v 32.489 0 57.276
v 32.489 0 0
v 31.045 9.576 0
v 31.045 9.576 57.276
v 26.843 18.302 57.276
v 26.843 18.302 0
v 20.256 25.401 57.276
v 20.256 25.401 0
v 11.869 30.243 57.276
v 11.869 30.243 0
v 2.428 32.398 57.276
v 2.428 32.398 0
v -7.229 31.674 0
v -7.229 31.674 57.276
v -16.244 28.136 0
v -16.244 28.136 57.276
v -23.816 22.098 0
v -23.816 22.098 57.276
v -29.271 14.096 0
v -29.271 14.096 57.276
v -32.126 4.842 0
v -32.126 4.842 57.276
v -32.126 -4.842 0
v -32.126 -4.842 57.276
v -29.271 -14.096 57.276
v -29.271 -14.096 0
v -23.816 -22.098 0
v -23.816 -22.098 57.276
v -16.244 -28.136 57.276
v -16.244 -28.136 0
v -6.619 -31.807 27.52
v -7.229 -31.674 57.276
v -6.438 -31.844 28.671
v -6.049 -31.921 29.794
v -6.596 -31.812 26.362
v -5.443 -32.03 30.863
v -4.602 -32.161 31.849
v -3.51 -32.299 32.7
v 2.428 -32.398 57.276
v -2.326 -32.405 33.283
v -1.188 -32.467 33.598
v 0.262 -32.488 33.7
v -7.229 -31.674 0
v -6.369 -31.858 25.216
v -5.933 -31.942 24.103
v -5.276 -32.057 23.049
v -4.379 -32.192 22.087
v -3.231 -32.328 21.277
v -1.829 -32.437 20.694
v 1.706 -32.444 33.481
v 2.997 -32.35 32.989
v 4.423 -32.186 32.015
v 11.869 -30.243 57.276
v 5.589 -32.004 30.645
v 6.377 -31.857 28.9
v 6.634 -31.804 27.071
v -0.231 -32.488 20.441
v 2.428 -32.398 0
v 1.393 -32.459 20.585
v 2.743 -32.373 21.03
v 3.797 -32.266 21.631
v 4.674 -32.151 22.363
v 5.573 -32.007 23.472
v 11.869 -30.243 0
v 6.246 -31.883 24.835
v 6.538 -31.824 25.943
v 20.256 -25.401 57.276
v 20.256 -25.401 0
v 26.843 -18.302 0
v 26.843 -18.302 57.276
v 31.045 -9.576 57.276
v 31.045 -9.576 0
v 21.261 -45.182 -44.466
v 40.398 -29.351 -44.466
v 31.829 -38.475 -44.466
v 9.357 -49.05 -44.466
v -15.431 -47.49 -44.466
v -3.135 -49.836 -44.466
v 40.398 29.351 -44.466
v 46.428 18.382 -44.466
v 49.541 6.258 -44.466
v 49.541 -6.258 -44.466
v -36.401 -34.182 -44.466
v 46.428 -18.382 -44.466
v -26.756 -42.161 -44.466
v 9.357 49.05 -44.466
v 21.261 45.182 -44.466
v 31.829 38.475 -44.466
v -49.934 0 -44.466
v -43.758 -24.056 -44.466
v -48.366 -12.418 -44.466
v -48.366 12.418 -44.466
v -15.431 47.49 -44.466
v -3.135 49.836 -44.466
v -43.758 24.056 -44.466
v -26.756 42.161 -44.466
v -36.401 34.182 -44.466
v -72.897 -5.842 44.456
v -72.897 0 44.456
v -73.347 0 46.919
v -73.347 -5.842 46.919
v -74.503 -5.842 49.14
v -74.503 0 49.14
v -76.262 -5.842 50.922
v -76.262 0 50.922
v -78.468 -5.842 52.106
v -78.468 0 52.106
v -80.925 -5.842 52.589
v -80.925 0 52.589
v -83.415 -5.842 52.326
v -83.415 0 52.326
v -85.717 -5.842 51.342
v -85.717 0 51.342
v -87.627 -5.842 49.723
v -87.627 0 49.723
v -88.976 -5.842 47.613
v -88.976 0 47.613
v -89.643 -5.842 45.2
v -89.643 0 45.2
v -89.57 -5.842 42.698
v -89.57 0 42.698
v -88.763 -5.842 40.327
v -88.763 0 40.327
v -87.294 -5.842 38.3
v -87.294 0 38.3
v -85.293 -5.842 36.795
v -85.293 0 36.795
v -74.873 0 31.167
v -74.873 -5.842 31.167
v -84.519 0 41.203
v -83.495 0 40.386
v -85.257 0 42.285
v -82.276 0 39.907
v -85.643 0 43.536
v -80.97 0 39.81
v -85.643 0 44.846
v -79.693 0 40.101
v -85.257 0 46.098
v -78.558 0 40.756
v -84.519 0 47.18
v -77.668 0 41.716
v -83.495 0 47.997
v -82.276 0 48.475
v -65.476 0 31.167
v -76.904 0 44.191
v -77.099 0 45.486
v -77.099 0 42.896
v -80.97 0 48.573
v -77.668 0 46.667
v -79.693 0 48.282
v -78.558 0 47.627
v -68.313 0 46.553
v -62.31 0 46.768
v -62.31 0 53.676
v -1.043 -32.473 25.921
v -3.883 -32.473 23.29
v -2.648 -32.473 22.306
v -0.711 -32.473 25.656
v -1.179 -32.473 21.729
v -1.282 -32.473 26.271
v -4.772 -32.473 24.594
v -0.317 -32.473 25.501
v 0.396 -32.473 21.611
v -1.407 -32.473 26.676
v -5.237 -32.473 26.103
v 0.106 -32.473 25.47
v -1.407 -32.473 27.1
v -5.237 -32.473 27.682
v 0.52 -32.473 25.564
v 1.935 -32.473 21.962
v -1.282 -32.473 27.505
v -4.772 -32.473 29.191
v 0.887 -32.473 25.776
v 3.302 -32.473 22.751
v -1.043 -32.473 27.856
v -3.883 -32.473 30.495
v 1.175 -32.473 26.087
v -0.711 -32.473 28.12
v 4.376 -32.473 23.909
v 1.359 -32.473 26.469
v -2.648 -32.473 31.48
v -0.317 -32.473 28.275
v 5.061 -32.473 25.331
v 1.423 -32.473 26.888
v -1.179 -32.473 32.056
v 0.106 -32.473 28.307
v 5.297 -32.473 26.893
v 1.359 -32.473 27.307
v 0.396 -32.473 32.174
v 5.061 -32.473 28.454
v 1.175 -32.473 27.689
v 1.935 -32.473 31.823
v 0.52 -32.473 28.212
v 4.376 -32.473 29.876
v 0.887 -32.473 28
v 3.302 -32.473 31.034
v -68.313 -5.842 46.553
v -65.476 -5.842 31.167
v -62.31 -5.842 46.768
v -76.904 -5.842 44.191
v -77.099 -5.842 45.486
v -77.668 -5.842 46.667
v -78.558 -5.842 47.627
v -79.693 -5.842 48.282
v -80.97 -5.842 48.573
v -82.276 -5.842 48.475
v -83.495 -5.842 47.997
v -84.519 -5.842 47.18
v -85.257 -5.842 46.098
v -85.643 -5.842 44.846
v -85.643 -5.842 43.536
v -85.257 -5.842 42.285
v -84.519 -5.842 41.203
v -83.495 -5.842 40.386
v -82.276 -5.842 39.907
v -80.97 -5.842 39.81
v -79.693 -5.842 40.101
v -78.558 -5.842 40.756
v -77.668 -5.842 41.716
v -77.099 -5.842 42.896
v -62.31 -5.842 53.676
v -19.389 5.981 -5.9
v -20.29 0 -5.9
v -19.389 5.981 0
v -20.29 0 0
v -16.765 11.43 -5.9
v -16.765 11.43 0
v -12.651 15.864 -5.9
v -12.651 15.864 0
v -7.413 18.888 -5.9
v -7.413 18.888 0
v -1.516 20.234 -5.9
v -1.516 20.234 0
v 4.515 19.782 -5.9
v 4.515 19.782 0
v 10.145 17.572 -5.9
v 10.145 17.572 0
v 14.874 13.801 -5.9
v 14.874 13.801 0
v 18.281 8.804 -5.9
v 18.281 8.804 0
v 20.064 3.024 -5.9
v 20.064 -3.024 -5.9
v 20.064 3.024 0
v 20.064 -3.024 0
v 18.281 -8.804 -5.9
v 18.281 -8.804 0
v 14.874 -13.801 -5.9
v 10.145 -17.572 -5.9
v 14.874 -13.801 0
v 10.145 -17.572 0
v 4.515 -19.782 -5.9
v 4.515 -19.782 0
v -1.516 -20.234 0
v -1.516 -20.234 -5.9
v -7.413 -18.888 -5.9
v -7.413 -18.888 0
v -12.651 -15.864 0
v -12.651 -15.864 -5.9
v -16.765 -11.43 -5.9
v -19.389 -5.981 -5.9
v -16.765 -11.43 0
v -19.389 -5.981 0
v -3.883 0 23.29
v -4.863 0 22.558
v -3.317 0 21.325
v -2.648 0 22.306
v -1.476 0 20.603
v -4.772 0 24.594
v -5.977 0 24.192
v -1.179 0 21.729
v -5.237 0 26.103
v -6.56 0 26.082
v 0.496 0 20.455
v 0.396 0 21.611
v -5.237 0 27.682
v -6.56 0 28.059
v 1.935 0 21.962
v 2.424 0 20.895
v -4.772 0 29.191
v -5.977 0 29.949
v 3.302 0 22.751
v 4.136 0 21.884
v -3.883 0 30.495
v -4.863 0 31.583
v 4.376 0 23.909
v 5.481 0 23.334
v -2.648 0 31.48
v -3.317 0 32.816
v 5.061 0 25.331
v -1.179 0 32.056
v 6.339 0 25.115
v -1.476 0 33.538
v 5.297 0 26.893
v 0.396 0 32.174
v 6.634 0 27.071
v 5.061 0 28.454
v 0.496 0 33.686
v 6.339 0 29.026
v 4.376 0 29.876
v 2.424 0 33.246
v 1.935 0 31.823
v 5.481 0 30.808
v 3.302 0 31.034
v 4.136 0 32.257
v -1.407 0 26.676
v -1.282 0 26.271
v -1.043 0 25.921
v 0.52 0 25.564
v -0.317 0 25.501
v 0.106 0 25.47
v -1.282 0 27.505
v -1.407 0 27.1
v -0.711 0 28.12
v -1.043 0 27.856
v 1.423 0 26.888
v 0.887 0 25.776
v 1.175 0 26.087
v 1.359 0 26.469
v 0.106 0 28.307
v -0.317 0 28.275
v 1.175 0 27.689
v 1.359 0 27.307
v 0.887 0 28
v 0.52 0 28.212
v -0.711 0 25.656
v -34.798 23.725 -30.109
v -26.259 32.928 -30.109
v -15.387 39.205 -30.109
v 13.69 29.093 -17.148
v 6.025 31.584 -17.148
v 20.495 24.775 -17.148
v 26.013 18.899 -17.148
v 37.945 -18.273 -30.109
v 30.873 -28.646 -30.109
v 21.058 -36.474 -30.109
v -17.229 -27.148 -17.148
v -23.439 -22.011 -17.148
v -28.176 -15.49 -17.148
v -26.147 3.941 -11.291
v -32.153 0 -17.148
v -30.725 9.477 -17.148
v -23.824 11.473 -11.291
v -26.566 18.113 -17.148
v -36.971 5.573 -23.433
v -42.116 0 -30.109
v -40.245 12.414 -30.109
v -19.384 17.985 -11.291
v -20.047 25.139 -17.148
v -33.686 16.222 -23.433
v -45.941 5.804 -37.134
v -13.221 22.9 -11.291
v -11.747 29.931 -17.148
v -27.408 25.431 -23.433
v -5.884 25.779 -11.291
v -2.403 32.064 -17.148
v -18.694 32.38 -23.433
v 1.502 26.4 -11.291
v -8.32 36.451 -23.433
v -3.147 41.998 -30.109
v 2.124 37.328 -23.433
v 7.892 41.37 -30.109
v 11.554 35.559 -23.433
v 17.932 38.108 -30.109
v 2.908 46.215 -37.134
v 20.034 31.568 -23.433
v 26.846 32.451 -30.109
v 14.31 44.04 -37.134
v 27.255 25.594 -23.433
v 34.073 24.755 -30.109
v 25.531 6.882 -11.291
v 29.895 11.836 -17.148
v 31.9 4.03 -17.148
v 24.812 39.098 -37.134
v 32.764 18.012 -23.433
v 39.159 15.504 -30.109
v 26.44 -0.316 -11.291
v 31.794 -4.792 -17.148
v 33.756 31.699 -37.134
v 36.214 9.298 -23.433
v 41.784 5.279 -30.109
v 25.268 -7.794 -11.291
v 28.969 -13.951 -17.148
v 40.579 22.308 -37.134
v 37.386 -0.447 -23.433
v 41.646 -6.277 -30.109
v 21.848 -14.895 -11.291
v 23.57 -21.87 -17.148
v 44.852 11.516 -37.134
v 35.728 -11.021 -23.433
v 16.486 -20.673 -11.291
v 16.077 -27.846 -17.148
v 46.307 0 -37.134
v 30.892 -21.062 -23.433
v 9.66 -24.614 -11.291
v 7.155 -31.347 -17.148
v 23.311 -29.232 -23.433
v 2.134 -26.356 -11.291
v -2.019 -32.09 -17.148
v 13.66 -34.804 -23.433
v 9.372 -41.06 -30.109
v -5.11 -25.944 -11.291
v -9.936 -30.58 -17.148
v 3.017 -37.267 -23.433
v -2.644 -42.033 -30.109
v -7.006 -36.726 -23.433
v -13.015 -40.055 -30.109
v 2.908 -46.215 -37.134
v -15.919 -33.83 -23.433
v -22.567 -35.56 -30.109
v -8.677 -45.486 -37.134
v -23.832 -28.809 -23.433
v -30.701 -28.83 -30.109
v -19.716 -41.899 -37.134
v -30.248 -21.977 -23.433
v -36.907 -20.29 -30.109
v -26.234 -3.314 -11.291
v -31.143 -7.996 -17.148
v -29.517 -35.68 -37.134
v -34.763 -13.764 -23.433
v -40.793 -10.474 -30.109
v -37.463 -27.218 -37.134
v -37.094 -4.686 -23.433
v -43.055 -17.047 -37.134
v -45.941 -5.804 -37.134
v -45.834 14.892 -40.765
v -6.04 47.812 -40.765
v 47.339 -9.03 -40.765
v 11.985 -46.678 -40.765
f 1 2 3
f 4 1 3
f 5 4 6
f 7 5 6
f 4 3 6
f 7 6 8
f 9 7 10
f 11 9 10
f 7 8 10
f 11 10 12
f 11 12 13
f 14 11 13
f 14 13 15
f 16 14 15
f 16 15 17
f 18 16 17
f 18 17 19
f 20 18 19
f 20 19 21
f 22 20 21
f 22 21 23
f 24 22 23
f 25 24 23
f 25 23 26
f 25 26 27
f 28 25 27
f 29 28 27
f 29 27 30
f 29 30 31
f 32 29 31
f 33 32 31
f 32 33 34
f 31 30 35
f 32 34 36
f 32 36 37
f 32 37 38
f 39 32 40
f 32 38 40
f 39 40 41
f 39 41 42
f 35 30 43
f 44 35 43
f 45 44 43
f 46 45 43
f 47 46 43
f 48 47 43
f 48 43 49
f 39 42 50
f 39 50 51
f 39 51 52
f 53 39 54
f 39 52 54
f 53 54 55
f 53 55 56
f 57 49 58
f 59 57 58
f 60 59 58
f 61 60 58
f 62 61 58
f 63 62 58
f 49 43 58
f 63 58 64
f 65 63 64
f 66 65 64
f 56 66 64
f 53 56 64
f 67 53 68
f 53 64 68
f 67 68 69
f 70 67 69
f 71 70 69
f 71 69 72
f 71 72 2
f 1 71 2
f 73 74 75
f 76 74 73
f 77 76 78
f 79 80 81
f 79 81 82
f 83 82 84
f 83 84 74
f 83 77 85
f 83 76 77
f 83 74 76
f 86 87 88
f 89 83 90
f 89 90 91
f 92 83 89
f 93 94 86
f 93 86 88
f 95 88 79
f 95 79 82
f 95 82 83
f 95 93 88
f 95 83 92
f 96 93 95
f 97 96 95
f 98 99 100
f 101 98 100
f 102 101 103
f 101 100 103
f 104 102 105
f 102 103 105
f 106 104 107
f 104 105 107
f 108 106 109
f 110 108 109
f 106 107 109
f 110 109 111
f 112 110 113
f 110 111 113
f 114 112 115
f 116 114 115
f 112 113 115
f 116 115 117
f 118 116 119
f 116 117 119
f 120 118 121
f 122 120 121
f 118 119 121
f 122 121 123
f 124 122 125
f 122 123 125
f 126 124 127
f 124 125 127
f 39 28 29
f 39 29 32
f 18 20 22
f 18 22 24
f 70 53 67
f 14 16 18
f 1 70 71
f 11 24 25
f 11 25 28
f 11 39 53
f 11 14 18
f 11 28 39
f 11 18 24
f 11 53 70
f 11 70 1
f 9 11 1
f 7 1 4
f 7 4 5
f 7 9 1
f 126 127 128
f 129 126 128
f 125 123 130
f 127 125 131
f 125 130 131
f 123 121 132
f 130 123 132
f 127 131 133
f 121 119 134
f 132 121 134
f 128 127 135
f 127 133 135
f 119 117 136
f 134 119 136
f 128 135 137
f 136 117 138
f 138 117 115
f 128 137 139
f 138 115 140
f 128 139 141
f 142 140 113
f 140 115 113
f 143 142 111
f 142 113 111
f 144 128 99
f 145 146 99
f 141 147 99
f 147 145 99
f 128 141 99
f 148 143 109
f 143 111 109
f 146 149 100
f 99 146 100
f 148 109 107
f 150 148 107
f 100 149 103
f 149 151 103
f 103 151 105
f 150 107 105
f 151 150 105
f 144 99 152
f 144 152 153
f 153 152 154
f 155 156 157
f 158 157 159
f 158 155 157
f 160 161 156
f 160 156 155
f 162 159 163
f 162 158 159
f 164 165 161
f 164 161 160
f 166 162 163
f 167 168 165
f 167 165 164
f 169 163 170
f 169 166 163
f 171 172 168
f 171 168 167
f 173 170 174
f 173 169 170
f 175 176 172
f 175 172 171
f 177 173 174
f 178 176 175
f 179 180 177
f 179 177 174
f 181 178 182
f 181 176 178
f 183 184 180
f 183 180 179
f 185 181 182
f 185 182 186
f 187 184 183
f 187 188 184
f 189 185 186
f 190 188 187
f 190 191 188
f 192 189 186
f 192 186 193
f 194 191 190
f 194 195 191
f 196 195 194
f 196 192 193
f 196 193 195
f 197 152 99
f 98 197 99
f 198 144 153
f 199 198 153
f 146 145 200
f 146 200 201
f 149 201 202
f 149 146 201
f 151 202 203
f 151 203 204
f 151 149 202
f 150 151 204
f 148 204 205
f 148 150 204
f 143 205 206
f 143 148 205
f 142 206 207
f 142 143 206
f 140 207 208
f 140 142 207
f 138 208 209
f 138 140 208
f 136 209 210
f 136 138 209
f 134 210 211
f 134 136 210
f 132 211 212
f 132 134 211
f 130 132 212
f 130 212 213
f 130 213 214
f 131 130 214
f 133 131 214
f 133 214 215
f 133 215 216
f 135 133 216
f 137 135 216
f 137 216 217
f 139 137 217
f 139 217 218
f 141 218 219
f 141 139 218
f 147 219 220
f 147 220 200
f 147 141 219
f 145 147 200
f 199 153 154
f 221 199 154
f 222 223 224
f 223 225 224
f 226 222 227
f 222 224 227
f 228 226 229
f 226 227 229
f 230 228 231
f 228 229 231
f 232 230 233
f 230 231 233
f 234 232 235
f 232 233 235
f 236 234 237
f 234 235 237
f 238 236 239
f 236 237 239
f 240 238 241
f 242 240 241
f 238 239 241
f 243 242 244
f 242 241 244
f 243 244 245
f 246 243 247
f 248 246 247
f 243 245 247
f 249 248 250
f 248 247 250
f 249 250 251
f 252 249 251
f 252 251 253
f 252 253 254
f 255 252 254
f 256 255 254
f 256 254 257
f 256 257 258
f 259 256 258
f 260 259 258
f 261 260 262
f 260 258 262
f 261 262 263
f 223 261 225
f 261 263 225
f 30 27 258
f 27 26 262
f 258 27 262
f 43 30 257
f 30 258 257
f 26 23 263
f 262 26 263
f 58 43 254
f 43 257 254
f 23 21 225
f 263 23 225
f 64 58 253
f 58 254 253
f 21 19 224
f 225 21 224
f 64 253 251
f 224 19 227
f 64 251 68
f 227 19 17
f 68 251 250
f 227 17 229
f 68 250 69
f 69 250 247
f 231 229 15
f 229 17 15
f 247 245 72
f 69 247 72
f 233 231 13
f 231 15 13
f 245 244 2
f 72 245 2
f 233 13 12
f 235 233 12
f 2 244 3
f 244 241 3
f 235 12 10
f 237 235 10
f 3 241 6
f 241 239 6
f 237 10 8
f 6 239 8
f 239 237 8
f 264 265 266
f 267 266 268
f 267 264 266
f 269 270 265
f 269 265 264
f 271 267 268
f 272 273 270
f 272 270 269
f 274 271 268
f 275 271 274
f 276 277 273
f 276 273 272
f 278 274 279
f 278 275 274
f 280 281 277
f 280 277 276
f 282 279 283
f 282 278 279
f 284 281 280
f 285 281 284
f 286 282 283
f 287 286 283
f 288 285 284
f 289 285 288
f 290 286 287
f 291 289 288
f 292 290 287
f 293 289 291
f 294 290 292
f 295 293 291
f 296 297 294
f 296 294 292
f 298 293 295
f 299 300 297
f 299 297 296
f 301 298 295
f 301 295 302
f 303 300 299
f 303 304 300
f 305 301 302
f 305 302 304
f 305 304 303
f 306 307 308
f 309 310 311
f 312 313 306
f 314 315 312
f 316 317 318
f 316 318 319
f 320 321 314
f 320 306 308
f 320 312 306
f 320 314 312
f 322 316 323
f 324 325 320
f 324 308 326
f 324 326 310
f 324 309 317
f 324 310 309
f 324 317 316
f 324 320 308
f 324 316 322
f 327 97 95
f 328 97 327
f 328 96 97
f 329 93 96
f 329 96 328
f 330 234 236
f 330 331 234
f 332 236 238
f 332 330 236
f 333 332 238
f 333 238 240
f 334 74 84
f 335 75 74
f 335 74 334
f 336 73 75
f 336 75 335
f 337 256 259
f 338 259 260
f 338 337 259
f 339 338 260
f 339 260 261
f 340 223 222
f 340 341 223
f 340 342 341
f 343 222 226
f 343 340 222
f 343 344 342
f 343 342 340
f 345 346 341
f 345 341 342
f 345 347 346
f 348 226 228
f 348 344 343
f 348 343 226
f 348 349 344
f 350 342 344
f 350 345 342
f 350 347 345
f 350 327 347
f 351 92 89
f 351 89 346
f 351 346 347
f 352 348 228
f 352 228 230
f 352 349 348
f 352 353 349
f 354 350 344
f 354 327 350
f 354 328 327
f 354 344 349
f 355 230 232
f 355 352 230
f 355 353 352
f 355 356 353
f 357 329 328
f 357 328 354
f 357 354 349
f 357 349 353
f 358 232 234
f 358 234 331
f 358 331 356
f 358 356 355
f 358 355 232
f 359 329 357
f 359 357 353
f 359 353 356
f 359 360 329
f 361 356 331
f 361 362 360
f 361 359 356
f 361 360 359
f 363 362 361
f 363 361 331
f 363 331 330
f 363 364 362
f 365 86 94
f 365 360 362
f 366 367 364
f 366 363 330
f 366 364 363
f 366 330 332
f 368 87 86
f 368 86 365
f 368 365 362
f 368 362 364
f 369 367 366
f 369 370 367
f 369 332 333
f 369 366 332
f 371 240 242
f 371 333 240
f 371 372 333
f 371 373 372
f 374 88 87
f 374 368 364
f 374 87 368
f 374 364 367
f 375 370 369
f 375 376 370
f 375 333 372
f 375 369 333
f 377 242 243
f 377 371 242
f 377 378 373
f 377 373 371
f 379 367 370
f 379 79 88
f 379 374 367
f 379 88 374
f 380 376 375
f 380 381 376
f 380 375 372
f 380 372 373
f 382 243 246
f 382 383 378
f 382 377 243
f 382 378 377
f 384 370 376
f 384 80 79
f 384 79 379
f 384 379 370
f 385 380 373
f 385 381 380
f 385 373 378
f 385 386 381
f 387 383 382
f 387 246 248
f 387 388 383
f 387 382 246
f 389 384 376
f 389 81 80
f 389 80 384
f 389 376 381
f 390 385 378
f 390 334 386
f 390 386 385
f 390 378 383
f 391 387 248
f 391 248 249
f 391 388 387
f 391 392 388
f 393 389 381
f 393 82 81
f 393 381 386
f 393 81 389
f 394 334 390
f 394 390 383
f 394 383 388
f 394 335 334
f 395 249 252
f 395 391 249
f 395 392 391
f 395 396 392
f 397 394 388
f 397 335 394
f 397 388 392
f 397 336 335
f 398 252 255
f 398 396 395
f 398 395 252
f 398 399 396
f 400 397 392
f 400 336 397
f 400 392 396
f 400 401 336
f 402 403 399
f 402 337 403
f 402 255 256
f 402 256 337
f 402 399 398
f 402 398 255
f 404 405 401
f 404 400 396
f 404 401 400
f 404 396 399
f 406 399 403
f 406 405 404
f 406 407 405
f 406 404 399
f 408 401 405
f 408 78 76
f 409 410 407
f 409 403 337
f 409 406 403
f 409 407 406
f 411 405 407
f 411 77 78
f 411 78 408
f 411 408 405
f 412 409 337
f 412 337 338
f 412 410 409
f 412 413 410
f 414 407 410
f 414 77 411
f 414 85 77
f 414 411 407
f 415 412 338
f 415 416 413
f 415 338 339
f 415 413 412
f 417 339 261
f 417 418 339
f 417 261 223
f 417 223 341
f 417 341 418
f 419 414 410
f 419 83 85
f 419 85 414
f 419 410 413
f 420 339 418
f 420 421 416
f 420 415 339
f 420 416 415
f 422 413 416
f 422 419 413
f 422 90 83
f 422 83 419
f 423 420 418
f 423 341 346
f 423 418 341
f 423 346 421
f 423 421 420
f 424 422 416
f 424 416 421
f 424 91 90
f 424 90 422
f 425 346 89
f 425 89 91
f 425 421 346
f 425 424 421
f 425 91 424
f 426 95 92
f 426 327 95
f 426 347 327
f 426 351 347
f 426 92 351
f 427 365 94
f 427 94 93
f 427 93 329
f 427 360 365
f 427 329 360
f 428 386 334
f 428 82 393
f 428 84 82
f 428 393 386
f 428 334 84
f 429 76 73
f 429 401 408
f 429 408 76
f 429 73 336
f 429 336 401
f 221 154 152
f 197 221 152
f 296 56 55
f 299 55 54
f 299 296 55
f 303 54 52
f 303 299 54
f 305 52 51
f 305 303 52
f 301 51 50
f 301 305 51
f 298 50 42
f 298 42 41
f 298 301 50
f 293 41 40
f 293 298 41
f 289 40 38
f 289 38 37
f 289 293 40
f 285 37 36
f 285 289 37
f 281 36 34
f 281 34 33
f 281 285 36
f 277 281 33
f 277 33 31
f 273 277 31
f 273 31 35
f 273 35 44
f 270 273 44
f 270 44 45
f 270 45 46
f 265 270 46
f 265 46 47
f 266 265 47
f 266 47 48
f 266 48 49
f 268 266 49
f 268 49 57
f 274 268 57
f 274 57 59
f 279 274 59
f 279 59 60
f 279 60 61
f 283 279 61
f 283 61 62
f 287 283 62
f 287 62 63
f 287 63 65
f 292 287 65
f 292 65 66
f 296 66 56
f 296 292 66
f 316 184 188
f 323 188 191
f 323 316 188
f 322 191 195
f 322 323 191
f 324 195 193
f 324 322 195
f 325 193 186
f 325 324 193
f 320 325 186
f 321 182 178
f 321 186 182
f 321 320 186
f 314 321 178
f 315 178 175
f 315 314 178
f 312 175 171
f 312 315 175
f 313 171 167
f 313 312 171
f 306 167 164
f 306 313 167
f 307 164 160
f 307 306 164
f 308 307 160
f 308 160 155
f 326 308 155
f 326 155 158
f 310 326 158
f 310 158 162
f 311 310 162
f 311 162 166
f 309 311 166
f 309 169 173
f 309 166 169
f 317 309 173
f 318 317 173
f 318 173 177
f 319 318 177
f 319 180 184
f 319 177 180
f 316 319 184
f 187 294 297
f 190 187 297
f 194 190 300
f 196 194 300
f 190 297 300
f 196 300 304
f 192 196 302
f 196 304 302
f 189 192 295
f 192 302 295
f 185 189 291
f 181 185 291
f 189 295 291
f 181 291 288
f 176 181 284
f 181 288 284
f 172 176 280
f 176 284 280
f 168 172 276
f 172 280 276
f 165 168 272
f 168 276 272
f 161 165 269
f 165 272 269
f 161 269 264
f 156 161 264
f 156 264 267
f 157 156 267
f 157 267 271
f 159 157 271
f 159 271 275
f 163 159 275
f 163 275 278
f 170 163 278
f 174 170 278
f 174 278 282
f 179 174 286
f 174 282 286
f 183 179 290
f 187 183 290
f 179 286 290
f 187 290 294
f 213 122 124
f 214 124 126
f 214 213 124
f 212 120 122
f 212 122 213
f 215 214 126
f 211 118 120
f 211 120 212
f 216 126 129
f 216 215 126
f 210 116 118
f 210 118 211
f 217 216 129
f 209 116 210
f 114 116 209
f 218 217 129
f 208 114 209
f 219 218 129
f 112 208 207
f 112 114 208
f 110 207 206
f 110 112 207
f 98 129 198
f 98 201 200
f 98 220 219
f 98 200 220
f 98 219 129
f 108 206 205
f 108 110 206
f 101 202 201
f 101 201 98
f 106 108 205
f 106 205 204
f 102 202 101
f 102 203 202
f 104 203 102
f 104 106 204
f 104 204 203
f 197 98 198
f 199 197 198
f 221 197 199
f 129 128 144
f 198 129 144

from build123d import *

# Parameters (mm, degrees)
F0_R      = 32.488713
F1_DEPTH  = 57.275616
F2_R      = 6.634026
F3_DEPTH  = 67.93195
F4_R      = 5.296658
F5_DEPTH  = 32.472778
F6_R      = 1.422577
F7_DEPTH  = 36.744092
F8_W      = 20.290306
F8_H      = 5.900018
F10_R     = 4.394028
F11_DEPTH = 5.842


with BuildPart() as f1:
    # F0 (on Top) → F1 (new body)
    with BuildSketch(Plane.XY):
        Circle(F0_R)
    extrude(amount=F1_DEPTH)

    # F2 (on Front) → F3 (cut)
    with BuildSketch(Plane.XZ):
        with Locations((0, 27.070664)):
            Circle(F2_R)
    extrude(amount=F3_DEPTH, mode=Mode.SUBTRACT)

    # F4 (on Front) → F5 (join)
    with BuildSketch(Plane.XZ):
        with Locations((0, 26.89255)):
            Circle(F4_R)
    extrude(amount=F5_DEPTH)

    # F6 (on Front) → F7 (cut)
    with BuildSketch(Plane.XZ):
        with Locations((0, 26.888128)):
            Circle(F6_R)
    extrude(amount=F7_DEPTH, mode=Mode.SUBTRACT)

    # F8 (on Front) → F9 (revolve)
    with BuildSketch(Plane.XZ):
        with Locations((-10.145153, -2.950009)):
            Rectangle(F8_W, F8_H)
        Polygon((0, -5.900018), (-20.290306, -5.900018), (-49.934298, -44.465989), (-41.012321, -44.465989), (0, -44.465989), align=None)
        with BuildLine():
            Line((-49.934298, -44.465989), (-20.290306, -5.900018))
            ThreePointArc((-20.290306, -5.900018), (-37.388735, -23.433208), (-49.934298, -44.465989))
        make_face()
    revolve(axis=Axis((0, 0, -22.232994), (0, 0, -1)))


with BuildPart() as f11:
    # F10 (on Front) → F11 (new body)
    with BuildSketch(Plane.XZ):
        with BuildLine():
            ThreePointArc((-85.292622, 36.79541), (-76.992317, 36.972119), (-72.892344, 44.191295))
            ThreePointArc((-72.892344, 44.191295), (-72.893386, 44.323689), (-72.896514, 44.456051))
            ThreePointArc((-72.896514, 44.456051), (-85.71694, 51.341758), (-85.292622, 36.79541))
        make_face()
        with Locations((-81.298043, 44.191295)):
            Circle(F10_R, mode=Mode.SUBTRACT)
        with BuildLine():
            ThreePointArc((-72.896514, 44.456051), (-72.893386, 44.323689), (-72.892344, 44.191295))
            ThreePointArc((-72.892344, 44.191295), (-76.992317, 36.972119), (-85.292622, 36.79541))
            Line((-85.292622, 36.79541), (-74.872592, 31.167465))
            Line((-74.872592, 31.167465), (-65.475807, 31.167465))
            Line((-65.475807, 31.167465), (-62.309947, 46.768438))
            Line((-62.309947, 46.768438), (-62.309947, 53.675774))
            Line((-62.309947, 53.675774), (-68.313414, 46.553496))
            Line((-68.313414, 46.553496), (-72.896514, 44.456051))
        make_face()
    extrude(amount=F11_DEPTH)


solid = Compound([f1.part, f11.part])
